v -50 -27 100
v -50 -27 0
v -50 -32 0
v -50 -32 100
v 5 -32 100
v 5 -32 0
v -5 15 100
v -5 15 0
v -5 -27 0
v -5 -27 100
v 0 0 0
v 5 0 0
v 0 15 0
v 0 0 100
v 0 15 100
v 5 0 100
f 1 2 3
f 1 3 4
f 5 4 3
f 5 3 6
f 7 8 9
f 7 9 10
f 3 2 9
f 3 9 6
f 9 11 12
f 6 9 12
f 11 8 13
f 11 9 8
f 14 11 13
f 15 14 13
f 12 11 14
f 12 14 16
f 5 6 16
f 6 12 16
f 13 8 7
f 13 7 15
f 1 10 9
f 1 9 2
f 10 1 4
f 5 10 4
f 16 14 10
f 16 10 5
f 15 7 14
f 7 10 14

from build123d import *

# Parameters (mm, degrees)
F0_W     = 5
F0_H     = 15
F0_H_2   = 5
F1_DEPTH = 100
F2_DEPTH = 27
F3_DEPTH = 27


with BuildPart() as f1:
    # F0 (on Top) → F1 (new body)
    with BuildSketch(Plane.XY):
        Polygon((0, -5), (0, 0), (-5, 0), (-50, 0), (-50, -5), align=None)
        with Locations((-2.5, 7.5)):
            Rectangle(F0_W, F0_H)
        with Locations((2.5, -2.5)):
            Rectangle(F0_W, F0_H_2)
    extrude(amount=F1_DEPTH)

    # F2 (add): a face of the model
    f2_faces = [f1.faces().sort_by_distance(p)[0] for p in [
        (-22.5, -5, 50),
    ]]
    extrude(f2_faces, amount=F2_DEPTH)

    # F3 (cut): a face of the model
    f3_faces = [f1.faces().sort_by_distance(p)[0] for p in [
        (-27.5, 0, 50),
    ]]
    extrude(f3_faces, amount=-F3_DEPTH, mode=Mode.SUBTRACT)


solid = f1.part
